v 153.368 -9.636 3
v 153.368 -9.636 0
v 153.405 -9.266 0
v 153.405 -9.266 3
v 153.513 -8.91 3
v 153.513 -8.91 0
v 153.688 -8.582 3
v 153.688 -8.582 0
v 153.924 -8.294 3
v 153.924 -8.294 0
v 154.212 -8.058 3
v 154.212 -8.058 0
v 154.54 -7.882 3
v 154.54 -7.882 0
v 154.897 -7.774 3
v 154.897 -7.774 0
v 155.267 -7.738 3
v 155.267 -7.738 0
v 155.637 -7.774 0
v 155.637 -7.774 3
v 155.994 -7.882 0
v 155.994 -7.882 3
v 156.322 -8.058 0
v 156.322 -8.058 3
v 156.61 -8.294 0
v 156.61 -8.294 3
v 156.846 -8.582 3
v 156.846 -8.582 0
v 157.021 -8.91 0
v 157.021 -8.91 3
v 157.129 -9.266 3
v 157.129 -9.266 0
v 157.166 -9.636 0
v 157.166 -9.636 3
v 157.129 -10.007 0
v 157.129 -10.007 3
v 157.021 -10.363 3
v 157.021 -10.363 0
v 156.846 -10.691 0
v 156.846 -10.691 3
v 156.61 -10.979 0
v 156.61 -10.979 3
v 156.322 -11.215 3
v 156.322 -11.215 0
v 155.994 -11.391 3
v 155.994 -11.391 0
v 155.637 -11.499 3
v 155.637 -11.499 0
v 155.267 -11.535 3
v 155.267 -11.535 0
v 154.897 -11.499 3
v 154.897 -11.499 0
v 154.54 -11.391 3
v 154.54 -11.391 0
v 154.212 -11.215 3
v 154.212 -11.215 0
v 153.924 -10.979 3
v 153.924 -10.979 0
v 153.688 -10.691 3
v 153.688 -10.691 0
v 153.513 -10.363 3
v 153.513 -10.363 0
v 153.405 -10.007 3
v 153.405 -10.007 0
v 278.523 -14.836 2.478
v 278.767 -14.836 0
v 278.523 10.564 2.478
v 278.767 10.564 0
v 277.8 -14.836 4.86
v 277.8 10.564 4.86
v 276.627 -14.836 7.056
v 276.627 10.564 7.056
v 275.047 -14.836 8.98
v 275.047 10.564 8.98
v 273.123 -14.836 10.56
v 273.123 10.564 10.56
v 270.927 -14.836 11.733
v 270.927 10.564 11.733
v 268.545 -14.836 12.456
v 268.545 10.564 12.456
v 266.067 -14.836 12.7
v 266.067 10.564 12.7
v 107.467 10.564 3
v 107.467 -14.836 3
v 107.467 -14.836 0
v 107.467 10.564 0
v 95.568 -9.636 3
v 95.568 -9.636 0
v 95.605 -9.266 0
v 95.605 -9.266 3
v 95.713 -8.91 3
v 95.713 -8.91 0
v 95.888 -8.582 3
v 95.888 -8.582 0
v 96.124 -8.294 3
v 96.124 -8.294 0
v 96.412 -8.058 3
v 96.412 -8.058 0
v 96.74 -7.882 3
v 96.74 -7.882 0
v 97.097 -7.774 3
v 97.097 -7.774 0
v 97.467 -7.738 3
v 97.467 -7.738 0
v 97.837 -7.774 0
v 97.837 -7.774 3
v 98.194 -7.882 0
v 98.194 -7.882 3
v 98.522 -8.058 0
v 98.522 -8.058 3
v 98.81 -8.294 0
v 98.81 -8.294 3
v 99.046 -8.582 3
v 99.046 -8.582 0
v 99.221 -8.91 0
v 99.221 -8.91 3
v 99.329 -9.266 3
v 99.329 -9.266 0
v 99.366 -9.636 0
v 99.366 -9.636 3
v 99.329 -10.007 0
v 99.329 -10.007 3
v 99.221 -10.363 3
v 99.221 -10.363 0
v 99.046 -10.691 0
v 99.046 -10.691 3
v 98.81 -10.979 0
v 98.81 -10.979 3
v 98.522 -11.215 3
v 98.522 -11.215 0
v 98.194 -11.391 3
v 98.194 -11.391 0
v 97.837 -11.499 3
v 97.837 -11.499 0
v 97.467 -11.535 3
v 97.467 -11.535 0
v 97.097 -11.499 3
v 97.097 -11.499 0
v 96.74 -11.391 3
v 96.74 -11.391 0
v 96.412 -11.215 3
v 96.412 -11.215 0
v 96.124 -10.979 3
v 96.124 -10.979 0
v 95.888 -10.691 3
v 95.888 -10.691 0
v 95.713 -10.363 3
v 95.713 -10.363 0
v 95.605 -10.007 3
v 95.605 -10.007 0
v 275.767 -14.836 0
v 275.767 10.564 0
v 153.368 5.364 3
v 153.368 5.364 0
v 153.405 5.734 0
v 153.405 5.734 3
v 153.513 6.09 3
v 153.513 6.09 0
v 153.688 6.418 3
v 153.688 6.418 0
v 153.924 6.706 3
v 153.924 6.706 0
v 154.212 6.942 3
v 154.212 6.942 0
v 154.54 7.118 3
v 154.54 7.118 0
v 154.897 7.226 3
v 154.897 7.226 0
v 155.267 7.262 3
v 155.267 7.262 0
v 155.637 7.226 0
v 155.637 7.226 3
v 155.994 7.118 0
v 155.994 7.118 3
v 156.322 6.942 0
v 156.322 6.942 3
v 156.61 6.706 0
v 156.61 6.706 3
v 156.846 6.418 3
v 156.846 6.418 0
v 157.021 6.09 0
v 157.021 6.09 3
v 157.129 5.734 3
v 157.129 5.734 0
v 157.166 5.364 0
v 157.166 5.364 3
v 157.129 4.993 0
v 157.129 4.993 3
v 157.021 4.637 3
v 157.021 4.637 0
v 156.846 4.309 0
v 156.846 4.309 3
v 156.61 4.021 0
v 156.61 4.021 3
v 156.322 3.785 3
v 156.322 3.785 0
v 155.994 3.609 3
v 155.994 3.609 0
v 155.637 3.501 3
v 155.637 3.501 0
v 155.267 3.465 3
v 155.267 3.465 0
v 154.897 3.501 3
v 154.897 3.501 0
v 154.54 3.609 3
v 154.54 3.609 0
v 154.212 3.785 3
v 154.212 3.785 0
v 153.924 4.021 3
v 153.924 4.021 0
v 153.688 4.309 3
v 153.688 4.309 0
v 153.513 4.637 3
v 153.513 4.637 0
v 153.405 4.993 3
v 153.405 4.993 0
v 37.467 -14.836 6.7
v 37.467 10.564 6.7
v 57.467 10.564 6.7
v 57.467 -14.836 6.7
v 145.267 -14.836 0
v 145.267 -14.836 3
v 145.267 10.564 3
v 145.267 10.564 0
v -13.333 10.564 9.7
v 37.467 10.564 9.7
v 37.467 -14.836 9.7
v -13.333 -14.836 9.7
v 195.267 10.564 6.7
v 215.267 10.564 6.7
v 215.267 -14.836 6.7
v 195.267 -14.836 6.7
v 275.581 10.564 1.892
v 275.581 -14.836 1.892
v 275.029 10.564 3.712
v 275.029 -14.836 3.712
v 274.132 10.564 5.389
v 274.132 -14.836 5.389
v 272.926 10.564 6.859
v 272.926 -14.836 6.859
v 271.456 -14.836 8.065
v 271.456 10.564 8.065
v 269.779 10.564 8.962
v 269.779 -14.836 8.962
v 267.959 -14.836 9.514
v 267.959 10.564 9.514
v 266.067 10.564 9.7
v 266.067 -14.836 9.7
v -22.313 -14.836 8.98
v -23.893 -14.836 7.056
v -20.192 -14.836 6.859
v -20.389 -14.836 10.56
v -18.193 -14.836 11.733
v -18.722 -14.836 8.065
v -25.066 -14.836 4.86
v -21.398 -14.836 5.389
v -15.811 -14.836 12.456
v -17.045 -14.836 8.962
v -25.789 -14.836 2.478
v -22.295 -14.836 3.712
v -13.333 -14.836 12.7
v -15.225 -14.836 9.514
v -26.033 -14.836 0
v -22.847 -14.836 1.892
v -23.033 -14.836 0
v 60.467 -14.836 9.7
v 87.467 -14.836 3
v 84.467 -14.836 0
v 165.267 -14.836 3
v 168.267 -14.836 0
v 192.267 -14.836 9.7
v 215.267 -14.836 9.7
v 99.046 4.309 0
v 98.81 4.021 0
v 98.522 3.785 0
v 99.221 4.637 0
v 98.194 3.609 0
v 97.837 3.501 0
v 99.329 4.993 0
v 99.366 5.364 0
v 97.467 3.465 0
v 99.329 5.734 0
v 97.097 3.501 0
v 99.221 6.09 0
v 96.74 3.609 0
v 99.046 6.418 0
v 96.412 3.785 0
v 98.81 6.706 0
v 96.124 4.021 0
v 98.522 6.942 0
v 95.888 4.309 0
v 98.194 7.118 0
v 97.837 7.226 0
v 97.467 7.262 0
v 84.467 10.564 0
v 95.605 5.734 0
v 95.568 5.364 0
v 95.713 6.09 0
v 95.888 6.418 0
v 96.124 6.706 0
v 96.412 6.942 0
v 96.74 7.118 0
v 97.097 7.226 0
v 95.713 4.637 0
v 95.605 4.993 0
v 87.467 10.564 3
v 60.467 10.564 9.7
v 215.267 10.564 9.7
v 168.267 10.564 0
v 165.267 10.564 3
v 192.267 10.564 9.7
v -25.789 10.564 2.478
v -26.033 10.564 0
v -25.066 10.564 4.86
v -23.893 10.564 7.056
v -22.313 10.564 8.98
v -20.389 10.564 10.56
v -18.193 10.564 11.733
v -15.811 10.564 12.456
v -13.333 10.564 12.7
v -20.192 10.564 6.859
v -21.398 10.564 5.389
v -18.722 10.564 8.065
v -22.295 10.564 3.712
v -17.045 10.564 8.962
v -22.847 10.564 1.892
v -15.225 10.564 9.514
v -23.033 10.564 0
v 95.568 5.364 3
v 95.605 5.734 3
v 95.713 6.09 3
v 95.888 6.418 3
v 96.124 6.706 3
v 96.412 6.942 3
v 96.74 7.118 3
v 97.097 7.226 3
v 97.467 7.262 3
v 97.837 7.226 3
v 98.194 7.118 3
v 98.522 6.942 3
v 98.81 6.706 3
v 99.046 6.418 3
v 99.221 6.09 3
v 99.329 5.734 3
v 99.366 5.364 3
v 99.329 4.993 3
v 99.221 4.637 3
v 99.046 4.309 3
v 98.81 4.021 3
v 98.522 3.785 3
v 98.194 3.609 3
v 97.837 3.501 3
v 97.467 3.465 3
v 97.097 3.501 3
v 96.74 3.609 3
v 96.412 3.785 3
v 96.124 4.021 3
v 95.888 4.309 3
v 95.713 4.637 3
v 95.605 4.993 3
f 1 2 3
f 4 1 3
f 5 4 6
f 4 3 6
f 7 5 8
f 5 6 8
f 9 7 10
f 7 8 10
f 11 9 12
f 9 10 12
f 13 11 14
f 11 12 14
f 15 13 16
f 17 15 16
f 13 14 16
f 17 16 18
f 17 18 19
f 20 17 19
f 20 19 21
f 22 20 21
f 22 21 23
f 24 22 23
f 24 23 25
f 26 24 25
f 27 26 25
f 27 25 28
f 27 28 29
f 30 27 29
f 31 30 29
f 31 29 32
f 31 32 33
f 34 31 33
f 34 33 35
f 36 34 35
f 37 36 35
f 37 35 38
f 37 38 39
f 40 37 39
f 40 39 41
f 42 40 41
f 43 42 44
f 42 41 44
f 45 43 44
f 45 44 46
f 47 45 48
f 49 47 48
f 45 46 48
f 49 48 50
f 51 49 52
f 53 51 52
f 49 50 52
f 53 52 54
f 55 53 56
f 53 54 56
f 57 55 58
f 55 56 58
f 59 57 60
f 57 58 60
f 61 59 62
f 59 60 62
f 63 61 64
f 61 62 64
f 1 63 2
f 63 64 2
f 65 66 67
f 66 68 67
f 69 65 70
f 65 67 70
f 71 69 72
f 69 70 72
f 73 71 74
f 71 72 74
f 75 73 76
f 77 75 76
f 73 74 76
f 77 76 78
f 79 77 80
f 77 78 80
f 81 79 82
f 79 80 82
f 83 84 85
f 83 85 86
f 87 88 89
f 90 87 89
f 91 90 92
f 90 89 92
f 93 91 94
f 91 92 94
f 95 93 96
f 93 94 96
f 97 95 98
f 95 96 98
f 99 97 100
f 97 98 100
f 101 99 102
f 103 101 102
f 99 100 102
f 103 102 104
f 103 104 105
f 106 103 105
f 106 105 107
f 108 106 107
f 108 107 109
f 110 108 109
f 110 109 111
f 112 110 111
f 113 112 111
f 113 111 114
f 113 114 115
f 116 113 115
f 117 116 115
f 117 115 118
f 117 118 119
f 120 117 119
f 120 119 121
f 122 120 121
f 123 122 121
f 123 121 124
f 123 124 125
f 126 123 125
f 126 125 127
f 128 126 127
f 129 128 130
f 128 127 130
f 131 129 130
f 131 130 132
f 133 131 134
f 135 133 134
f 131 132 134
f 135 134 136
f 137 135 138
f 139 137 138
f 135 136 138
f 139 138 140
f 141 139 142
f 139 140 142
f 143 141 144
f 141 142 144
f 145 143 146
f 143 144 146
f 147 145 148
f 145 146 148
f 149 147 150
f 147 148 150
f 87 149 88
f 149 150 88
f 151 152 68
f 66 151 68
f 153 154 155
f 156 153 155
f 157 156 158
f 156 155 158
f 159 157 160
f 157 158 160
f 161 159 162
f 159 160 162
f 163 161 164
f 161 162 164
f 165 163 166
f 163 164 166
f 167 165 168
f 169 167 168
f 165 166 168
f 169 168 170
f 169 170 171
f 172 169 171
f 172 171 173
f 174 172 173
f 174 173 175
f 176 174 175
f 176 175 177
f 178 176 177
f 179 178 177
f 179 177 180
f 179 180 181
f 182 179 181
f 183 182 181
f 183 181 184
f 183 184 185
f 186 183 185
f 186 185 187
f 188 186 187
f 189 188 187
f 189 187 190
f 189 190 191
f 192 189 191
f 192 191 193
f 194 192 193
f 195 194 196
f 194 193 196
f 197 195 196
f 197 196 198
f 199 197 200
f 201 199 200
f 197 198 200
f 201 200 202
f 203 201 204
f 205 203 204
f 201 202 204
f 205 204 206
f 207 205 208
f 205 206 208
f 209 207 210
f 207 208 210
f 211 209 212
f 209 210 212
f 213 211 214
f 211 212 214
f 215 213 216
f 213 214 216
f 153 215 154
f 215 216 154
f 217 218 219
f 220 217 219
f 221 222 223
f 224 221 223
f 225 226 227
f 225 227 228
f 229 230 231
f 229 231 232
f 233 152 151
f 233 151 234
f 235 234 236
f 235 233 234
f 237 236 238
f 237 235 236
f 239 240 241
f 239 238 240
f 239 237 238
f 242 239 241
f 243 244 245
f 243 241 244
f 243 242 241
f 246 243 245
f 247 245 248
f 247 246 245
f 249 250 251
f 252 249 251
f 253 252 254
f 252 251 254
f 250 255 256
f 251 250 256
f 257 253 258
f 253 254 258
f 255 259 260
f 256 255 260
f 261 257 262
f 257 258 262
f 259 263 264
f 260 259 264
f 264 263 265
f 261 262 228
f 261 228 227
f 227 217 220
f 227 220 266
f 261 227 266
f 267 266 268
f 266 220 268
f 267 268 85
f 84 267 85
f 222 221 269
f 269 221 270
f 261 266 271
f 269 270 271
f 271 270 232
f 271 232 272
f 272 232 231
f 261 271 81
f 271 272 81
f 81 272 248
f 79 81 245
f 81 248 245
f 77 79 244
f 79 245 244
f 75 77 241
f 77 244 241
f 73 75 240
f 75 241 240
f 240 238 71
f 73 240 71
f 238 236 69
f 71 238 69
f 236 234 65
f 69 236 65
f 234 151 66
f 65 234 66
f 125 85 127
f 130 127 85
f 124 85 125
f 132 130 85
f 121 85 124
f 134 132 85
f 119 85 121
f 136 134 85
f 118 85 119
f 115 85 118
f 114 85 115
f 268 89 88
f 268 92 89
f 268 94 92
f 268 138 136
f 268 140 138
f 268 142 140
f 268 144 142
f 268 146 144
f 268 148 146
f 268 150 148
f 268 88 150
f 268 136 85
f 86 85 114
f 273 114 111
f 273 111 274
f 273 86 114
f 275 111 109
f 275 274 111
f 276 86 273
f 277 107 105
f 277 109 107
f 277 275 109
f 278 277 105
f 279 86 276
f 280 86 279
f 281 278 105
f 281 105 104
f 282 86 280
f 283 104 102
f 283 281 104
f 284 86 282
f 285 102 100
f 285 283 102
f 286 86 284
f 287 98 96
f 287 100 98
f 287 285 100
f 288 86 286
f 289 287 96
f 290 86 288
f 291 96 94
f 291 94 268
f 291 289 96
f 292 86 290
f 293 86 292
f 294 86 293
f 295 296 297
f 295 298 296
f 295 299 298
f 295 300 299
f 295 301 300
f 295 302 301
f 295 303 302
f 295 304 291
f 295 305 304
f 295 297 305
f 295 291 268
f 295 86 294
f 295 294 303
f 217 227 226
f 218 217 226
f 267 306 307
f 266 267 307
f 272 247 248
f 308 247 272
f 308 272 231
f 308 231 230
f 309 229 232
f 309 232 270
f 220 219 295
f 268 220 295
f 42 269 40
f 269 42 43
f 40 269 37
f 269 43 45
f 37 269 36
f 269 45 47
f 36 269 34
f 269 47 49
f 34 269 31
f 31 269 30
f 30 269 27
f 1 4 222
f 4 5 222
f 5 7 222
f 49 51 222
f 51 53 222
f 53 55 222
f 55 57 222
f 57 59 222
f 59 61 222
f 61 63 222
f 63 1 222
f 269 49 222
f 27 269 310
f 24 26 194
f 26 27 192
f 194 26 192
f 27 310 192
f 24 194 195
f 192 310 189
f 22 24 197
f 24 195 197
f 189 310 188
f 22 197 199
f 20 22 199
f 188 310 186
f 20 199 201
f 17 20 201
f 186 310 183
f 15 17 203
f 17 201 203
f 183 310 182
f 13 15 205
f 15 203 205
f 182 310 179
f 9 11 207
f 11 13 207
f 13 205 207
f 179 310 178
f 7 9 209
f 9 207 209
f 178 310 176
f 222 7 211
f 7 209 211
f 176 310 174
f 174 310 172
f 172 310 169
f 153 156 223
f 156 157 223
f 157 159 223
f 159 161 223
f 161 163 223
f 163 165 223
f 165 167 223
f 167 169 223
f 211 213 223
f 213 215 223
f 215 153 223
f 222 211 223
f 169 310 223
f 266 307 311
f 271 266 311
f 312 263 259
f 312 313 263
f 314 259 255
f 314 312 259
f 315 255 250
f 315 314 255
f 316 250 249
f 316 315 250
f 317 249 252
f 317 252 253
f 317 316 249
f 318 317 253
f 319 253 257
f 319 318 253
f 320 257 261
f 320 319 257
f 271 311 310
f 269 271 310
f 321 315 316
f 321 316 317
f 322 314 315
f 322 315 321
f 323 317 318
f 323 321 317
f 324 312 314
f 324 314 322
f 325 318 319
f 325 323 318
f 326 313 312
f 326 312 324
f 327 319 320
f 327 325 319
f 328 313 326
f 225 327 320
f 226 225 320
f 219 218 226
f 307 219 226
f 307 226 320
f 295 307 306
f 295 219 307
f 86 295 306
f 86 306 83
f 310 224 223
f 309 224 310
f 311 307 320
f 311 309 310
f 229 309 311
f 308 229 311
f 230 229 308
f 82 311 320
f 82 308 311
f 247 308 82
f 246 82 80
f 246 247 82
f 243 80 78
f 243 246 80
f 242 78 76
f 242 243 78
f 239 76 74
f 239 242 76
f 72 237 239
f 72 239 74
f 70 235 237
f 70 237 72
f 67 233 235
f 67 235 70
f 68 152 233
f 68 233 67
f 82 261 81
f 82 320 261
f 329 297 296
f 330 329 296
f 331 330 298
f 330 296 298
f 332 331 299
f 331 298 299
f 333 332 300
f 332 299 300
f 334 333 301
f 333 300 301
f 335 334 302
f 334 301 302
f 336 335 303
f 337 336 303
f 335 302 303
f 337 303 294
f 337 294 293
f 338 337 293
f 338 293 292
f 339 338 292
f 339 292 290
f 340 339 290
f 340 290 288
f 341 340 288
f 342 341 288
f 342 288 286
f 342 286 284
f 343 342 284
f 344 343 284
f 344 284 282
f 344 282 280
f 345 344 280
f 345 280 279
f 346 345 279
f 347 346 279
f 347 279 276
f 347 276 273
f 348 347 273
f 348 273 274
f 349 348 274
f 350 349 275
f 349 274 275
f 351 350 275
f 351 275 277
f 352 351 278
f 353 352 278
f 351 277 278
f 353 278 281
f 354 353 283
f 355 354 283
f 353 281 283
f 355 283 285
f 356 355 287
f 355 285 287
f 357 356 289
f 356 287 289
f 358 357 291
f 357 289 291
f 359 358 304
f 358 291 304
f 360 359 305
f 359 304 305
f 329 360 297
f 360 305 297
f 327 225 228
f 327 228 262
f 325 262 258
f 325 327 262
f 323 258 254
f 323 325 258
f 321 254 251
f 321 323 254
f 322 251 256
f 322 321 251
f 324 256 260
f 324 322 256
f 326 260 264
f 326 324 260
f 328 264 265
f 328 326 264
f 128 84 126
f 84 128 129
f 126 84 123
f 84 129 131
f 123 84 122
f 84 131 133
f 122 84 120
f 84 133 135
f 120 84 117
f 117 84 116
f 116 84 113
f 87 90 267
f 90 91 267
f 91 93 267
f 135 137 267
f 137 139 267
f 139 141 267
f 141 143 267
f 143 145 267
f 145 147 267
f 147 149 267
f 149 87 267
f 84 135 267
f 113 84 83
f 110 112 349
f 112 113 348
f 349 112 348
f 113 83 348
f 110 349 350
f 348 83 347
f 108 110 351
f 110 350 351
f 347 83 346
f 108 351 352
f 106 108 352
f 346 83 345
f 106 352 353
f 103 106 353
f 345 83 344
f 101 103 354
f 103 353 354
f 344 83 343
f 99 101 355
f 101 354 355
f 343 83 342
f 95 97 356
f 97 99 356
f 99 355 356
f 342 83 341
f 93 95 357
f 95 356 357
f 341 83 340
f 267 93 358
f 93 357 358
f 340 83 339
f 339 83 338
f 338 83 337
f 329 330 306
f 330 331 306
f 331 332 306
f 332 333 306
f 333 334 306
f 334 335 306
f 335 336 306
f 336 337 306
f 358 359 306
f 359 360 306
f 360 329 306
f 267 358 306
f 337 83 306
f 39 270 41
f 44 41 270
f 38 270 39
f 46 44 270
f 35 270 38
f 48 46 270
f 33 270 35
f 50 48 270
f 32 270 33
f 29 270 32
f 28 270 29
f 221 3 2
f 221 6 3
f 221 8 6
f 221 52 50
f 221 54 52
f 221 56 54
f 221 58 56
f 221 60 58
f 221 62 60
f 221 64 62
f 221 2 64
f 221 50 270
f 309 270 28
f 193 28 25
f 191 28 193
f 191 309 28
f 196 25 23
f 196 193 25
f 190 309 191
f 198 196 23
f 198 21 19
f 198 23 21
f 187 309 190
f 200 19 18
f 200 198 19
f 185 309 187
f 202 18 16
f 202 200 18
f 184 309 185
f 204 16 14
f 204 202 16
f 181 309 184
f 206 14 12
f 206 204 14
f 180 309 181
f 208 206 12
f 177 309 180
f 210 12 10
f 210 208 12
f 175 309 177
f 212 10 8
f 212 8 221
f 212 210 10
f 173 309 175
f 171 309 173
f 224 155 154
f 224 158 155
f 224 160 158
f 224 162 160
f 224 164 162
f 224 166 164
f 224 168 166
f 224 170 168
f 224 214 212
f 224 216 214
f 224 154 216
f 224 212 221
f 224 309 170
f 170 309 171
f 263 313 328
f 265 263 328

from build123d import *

# Parameters (mm, degrees)
SKETCH1_W                 = 304.8
SKETCH1_H                 = 25.4
BOSS_EXTRUDE2_DEPTH       = 12.7
FILLET1_R                 = 12.7
CUT_EXTRUDE3_DEPTH        = 281.209703849
SKETCH8_W                 = 70
SKETCH8_H                 = 25.4
BOSS_EXTRUDE3_DEPTH       = 9.7
CUT_EXTRUDE4_DEPTH        = 281.209703849
CUT_EXTRUDE5_DEPTH        = 281.209703849
F_6_CLEARANCE_HOLE1_D     = 3.7973
F_6_CLEARANCE_HOLE1_DEPTH = 3


with BuildPart() as part:
    # Sketch1 → Boss-Extrude2 (new body)
    with BuildSketch(Plane.XY):
        with Locations((126.366978193, -2.136448598)):
            Rectangle(SKETCH1_W, SKETCH1_H)
    extrude(amount=BOSS_EXTRUDE2_DEPTH)

    # Fillet1
    fillet1_edges = [part.edges().sort_by_distance(p)[0] for p in [
        (-26.033021807, -2.136448598, 12.7),
        (278.766978193, -2.136448598, 12.7),
    ]]
    fillet(fillet1_edges, radius=FILLET1_R - 0.0001)  # a hair under: the kernel refuses the full size

    # Sketch6 → Cut-Extrude3 (cut, through all)
    with BuildSketch(Plane(origin=(0, 10.563551402, 0), x_dir=(1, 0, 0), z_dir=(0, 1, 0))):
        with BuildLine():
            Line((-23.033021807, 0), (275.766978193, 0))
            ThreePointArc((275.766978193, 0), (272.925913971, -6.858935778), (266.066978193, -9.7))
            Line((266.066978193, -9.7), (-13.333021807, -9.7))
            ThreePointArc((-13.333021807, -9.7), (-20.191957584, -6.858935778), (-23.033021807, 0))
        make_face()
    extrude(amount=-CUT_EXTRUDE3_DEPTH, mode=Mode.SUBTRACT)

    # Sketch8 → Boss-Extrude3 (add)
    with BuildSketch(Plane(origin=(0, 0, 9.7), x_dir=(-1, 0, 0), z_dir=(0, 0, -1))):
        with Locations((-180.266978193, -2.136448598)):
            Rectangle(SKETCH8_W, SKETCH8_H)
        with Locations((-72.466978193, -2.136448598)):
            Rectangle(SKETCH8_W, SKETCH8_H)
    extrude(amount=BOSS_EXTRUDE3_DEPTH)

    # Sketch9 → Cut-Extrude4 (cut, through all)
    with BuildSketch(Plane(origin=(0, 10.563551402, 0), x_dir=(1, 0, 0), z_dir=(0, 1, 0))):
        Polygon((145.266978193, -9.7), (165.266978193, -9.7), (192.266978193, -9.7), (165.266978193, -3), (145.266978193, -3), align=None)
        Polygon((215.266978193, -6.7), (195.266978193, -6.7), (168.266978193, 0), (215.266978193, 0), align=None)
    extrude(amount=-CUT_EXTRUDE4_DEPTH, mode=Mode.SUBTRACT)

    # Sketch12 → Cut-Extrude5 (cut, through all)
    with BuildSketch(Plane(origin=(0, 10.563551402, 0), x_dir=(1, 0, 0), z_dir=(0, 1, 0))):
        Polygon((107.466978193, -9.7), (107.466978193, -3), (87.466978193, -3), (60.466978193, -9.7), align=None)
        Polygon((37.466978193, -6.7), (57.466978193, -6.7), (84.466978193, 0), (37.466978193, 0), align=None)
    extrude(amount=-CUT_EXTRUDE5_DEPTH, mode=Mode.SUBTRACT)

    # #6 Clearance Hole1
    with Locations(Plane.XY.offset(3)):
        with Locations((97.466978193, 5.363551402), (155.266978193, 5.363551402), (155.266978193, -9.636448598), (97.466978193, -9.636448598)):
            Hole(F_6_CLEARANCE_HOLE1_D / 2, depth=F_6_CLEARANCE_HOLE1_DEPTH)


solid = part.part
